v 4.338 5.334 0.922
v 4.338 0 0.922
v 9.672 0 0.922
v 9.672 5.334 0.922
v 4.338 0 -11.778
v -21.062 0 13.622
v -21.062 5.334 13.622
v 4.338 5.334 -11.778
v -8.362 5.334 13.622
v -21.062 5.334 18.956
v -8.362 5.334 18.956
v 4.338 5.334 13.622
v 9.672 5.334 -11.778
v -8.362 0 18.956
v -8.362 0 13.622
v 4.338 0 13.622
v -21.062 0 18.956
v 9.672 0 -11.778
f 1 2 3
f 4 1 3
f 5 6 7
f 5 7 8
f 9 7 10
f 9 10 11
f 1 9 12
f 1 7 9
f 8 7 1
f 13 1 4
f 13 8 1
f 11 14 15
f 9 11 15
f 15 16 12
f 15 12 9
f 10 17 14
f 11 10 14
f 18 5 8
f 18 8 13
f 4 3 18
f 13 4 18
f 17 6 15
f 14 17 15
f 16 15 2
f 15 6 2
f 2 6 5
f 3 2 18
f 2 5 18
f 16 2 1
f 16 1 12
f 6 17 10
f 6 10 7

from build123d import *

# Parameters (mm, degrees)
SKETCH1_W           = 12.7
SKETCH1_H           = 5.334
SKETCH1_W_2         = 5.334
SKETCH1_H_2         = 12.7
BOSS_EXTRUDE1_DEPTH = 5.334


with BuildPart() as part:
    # Sketch1 → Boss-Extrude1 (new body)
    with BuildSketch(Plane(origin=(0, 0, 0), x_dir=(1, 0, 0), z_dir=(0, 1, 0))):
        with Locations((-14.711985437, -16.289114223)):
            Rectangle(SKETCH1_W, SKETCH1_H)
        Polygon((4.338014563, 11.777885777), (4.338014563, -13.622114223), (-21.061985437, -13.622114223), align=None)
        with Locations((7.005014563, 5.427885777)):
            Rectangle(SKETCH1_W_2, SKETCH1_H_2)
    extrude(amount=BOSS_EXTRUDE1_DEPTH)


solid = part.part
